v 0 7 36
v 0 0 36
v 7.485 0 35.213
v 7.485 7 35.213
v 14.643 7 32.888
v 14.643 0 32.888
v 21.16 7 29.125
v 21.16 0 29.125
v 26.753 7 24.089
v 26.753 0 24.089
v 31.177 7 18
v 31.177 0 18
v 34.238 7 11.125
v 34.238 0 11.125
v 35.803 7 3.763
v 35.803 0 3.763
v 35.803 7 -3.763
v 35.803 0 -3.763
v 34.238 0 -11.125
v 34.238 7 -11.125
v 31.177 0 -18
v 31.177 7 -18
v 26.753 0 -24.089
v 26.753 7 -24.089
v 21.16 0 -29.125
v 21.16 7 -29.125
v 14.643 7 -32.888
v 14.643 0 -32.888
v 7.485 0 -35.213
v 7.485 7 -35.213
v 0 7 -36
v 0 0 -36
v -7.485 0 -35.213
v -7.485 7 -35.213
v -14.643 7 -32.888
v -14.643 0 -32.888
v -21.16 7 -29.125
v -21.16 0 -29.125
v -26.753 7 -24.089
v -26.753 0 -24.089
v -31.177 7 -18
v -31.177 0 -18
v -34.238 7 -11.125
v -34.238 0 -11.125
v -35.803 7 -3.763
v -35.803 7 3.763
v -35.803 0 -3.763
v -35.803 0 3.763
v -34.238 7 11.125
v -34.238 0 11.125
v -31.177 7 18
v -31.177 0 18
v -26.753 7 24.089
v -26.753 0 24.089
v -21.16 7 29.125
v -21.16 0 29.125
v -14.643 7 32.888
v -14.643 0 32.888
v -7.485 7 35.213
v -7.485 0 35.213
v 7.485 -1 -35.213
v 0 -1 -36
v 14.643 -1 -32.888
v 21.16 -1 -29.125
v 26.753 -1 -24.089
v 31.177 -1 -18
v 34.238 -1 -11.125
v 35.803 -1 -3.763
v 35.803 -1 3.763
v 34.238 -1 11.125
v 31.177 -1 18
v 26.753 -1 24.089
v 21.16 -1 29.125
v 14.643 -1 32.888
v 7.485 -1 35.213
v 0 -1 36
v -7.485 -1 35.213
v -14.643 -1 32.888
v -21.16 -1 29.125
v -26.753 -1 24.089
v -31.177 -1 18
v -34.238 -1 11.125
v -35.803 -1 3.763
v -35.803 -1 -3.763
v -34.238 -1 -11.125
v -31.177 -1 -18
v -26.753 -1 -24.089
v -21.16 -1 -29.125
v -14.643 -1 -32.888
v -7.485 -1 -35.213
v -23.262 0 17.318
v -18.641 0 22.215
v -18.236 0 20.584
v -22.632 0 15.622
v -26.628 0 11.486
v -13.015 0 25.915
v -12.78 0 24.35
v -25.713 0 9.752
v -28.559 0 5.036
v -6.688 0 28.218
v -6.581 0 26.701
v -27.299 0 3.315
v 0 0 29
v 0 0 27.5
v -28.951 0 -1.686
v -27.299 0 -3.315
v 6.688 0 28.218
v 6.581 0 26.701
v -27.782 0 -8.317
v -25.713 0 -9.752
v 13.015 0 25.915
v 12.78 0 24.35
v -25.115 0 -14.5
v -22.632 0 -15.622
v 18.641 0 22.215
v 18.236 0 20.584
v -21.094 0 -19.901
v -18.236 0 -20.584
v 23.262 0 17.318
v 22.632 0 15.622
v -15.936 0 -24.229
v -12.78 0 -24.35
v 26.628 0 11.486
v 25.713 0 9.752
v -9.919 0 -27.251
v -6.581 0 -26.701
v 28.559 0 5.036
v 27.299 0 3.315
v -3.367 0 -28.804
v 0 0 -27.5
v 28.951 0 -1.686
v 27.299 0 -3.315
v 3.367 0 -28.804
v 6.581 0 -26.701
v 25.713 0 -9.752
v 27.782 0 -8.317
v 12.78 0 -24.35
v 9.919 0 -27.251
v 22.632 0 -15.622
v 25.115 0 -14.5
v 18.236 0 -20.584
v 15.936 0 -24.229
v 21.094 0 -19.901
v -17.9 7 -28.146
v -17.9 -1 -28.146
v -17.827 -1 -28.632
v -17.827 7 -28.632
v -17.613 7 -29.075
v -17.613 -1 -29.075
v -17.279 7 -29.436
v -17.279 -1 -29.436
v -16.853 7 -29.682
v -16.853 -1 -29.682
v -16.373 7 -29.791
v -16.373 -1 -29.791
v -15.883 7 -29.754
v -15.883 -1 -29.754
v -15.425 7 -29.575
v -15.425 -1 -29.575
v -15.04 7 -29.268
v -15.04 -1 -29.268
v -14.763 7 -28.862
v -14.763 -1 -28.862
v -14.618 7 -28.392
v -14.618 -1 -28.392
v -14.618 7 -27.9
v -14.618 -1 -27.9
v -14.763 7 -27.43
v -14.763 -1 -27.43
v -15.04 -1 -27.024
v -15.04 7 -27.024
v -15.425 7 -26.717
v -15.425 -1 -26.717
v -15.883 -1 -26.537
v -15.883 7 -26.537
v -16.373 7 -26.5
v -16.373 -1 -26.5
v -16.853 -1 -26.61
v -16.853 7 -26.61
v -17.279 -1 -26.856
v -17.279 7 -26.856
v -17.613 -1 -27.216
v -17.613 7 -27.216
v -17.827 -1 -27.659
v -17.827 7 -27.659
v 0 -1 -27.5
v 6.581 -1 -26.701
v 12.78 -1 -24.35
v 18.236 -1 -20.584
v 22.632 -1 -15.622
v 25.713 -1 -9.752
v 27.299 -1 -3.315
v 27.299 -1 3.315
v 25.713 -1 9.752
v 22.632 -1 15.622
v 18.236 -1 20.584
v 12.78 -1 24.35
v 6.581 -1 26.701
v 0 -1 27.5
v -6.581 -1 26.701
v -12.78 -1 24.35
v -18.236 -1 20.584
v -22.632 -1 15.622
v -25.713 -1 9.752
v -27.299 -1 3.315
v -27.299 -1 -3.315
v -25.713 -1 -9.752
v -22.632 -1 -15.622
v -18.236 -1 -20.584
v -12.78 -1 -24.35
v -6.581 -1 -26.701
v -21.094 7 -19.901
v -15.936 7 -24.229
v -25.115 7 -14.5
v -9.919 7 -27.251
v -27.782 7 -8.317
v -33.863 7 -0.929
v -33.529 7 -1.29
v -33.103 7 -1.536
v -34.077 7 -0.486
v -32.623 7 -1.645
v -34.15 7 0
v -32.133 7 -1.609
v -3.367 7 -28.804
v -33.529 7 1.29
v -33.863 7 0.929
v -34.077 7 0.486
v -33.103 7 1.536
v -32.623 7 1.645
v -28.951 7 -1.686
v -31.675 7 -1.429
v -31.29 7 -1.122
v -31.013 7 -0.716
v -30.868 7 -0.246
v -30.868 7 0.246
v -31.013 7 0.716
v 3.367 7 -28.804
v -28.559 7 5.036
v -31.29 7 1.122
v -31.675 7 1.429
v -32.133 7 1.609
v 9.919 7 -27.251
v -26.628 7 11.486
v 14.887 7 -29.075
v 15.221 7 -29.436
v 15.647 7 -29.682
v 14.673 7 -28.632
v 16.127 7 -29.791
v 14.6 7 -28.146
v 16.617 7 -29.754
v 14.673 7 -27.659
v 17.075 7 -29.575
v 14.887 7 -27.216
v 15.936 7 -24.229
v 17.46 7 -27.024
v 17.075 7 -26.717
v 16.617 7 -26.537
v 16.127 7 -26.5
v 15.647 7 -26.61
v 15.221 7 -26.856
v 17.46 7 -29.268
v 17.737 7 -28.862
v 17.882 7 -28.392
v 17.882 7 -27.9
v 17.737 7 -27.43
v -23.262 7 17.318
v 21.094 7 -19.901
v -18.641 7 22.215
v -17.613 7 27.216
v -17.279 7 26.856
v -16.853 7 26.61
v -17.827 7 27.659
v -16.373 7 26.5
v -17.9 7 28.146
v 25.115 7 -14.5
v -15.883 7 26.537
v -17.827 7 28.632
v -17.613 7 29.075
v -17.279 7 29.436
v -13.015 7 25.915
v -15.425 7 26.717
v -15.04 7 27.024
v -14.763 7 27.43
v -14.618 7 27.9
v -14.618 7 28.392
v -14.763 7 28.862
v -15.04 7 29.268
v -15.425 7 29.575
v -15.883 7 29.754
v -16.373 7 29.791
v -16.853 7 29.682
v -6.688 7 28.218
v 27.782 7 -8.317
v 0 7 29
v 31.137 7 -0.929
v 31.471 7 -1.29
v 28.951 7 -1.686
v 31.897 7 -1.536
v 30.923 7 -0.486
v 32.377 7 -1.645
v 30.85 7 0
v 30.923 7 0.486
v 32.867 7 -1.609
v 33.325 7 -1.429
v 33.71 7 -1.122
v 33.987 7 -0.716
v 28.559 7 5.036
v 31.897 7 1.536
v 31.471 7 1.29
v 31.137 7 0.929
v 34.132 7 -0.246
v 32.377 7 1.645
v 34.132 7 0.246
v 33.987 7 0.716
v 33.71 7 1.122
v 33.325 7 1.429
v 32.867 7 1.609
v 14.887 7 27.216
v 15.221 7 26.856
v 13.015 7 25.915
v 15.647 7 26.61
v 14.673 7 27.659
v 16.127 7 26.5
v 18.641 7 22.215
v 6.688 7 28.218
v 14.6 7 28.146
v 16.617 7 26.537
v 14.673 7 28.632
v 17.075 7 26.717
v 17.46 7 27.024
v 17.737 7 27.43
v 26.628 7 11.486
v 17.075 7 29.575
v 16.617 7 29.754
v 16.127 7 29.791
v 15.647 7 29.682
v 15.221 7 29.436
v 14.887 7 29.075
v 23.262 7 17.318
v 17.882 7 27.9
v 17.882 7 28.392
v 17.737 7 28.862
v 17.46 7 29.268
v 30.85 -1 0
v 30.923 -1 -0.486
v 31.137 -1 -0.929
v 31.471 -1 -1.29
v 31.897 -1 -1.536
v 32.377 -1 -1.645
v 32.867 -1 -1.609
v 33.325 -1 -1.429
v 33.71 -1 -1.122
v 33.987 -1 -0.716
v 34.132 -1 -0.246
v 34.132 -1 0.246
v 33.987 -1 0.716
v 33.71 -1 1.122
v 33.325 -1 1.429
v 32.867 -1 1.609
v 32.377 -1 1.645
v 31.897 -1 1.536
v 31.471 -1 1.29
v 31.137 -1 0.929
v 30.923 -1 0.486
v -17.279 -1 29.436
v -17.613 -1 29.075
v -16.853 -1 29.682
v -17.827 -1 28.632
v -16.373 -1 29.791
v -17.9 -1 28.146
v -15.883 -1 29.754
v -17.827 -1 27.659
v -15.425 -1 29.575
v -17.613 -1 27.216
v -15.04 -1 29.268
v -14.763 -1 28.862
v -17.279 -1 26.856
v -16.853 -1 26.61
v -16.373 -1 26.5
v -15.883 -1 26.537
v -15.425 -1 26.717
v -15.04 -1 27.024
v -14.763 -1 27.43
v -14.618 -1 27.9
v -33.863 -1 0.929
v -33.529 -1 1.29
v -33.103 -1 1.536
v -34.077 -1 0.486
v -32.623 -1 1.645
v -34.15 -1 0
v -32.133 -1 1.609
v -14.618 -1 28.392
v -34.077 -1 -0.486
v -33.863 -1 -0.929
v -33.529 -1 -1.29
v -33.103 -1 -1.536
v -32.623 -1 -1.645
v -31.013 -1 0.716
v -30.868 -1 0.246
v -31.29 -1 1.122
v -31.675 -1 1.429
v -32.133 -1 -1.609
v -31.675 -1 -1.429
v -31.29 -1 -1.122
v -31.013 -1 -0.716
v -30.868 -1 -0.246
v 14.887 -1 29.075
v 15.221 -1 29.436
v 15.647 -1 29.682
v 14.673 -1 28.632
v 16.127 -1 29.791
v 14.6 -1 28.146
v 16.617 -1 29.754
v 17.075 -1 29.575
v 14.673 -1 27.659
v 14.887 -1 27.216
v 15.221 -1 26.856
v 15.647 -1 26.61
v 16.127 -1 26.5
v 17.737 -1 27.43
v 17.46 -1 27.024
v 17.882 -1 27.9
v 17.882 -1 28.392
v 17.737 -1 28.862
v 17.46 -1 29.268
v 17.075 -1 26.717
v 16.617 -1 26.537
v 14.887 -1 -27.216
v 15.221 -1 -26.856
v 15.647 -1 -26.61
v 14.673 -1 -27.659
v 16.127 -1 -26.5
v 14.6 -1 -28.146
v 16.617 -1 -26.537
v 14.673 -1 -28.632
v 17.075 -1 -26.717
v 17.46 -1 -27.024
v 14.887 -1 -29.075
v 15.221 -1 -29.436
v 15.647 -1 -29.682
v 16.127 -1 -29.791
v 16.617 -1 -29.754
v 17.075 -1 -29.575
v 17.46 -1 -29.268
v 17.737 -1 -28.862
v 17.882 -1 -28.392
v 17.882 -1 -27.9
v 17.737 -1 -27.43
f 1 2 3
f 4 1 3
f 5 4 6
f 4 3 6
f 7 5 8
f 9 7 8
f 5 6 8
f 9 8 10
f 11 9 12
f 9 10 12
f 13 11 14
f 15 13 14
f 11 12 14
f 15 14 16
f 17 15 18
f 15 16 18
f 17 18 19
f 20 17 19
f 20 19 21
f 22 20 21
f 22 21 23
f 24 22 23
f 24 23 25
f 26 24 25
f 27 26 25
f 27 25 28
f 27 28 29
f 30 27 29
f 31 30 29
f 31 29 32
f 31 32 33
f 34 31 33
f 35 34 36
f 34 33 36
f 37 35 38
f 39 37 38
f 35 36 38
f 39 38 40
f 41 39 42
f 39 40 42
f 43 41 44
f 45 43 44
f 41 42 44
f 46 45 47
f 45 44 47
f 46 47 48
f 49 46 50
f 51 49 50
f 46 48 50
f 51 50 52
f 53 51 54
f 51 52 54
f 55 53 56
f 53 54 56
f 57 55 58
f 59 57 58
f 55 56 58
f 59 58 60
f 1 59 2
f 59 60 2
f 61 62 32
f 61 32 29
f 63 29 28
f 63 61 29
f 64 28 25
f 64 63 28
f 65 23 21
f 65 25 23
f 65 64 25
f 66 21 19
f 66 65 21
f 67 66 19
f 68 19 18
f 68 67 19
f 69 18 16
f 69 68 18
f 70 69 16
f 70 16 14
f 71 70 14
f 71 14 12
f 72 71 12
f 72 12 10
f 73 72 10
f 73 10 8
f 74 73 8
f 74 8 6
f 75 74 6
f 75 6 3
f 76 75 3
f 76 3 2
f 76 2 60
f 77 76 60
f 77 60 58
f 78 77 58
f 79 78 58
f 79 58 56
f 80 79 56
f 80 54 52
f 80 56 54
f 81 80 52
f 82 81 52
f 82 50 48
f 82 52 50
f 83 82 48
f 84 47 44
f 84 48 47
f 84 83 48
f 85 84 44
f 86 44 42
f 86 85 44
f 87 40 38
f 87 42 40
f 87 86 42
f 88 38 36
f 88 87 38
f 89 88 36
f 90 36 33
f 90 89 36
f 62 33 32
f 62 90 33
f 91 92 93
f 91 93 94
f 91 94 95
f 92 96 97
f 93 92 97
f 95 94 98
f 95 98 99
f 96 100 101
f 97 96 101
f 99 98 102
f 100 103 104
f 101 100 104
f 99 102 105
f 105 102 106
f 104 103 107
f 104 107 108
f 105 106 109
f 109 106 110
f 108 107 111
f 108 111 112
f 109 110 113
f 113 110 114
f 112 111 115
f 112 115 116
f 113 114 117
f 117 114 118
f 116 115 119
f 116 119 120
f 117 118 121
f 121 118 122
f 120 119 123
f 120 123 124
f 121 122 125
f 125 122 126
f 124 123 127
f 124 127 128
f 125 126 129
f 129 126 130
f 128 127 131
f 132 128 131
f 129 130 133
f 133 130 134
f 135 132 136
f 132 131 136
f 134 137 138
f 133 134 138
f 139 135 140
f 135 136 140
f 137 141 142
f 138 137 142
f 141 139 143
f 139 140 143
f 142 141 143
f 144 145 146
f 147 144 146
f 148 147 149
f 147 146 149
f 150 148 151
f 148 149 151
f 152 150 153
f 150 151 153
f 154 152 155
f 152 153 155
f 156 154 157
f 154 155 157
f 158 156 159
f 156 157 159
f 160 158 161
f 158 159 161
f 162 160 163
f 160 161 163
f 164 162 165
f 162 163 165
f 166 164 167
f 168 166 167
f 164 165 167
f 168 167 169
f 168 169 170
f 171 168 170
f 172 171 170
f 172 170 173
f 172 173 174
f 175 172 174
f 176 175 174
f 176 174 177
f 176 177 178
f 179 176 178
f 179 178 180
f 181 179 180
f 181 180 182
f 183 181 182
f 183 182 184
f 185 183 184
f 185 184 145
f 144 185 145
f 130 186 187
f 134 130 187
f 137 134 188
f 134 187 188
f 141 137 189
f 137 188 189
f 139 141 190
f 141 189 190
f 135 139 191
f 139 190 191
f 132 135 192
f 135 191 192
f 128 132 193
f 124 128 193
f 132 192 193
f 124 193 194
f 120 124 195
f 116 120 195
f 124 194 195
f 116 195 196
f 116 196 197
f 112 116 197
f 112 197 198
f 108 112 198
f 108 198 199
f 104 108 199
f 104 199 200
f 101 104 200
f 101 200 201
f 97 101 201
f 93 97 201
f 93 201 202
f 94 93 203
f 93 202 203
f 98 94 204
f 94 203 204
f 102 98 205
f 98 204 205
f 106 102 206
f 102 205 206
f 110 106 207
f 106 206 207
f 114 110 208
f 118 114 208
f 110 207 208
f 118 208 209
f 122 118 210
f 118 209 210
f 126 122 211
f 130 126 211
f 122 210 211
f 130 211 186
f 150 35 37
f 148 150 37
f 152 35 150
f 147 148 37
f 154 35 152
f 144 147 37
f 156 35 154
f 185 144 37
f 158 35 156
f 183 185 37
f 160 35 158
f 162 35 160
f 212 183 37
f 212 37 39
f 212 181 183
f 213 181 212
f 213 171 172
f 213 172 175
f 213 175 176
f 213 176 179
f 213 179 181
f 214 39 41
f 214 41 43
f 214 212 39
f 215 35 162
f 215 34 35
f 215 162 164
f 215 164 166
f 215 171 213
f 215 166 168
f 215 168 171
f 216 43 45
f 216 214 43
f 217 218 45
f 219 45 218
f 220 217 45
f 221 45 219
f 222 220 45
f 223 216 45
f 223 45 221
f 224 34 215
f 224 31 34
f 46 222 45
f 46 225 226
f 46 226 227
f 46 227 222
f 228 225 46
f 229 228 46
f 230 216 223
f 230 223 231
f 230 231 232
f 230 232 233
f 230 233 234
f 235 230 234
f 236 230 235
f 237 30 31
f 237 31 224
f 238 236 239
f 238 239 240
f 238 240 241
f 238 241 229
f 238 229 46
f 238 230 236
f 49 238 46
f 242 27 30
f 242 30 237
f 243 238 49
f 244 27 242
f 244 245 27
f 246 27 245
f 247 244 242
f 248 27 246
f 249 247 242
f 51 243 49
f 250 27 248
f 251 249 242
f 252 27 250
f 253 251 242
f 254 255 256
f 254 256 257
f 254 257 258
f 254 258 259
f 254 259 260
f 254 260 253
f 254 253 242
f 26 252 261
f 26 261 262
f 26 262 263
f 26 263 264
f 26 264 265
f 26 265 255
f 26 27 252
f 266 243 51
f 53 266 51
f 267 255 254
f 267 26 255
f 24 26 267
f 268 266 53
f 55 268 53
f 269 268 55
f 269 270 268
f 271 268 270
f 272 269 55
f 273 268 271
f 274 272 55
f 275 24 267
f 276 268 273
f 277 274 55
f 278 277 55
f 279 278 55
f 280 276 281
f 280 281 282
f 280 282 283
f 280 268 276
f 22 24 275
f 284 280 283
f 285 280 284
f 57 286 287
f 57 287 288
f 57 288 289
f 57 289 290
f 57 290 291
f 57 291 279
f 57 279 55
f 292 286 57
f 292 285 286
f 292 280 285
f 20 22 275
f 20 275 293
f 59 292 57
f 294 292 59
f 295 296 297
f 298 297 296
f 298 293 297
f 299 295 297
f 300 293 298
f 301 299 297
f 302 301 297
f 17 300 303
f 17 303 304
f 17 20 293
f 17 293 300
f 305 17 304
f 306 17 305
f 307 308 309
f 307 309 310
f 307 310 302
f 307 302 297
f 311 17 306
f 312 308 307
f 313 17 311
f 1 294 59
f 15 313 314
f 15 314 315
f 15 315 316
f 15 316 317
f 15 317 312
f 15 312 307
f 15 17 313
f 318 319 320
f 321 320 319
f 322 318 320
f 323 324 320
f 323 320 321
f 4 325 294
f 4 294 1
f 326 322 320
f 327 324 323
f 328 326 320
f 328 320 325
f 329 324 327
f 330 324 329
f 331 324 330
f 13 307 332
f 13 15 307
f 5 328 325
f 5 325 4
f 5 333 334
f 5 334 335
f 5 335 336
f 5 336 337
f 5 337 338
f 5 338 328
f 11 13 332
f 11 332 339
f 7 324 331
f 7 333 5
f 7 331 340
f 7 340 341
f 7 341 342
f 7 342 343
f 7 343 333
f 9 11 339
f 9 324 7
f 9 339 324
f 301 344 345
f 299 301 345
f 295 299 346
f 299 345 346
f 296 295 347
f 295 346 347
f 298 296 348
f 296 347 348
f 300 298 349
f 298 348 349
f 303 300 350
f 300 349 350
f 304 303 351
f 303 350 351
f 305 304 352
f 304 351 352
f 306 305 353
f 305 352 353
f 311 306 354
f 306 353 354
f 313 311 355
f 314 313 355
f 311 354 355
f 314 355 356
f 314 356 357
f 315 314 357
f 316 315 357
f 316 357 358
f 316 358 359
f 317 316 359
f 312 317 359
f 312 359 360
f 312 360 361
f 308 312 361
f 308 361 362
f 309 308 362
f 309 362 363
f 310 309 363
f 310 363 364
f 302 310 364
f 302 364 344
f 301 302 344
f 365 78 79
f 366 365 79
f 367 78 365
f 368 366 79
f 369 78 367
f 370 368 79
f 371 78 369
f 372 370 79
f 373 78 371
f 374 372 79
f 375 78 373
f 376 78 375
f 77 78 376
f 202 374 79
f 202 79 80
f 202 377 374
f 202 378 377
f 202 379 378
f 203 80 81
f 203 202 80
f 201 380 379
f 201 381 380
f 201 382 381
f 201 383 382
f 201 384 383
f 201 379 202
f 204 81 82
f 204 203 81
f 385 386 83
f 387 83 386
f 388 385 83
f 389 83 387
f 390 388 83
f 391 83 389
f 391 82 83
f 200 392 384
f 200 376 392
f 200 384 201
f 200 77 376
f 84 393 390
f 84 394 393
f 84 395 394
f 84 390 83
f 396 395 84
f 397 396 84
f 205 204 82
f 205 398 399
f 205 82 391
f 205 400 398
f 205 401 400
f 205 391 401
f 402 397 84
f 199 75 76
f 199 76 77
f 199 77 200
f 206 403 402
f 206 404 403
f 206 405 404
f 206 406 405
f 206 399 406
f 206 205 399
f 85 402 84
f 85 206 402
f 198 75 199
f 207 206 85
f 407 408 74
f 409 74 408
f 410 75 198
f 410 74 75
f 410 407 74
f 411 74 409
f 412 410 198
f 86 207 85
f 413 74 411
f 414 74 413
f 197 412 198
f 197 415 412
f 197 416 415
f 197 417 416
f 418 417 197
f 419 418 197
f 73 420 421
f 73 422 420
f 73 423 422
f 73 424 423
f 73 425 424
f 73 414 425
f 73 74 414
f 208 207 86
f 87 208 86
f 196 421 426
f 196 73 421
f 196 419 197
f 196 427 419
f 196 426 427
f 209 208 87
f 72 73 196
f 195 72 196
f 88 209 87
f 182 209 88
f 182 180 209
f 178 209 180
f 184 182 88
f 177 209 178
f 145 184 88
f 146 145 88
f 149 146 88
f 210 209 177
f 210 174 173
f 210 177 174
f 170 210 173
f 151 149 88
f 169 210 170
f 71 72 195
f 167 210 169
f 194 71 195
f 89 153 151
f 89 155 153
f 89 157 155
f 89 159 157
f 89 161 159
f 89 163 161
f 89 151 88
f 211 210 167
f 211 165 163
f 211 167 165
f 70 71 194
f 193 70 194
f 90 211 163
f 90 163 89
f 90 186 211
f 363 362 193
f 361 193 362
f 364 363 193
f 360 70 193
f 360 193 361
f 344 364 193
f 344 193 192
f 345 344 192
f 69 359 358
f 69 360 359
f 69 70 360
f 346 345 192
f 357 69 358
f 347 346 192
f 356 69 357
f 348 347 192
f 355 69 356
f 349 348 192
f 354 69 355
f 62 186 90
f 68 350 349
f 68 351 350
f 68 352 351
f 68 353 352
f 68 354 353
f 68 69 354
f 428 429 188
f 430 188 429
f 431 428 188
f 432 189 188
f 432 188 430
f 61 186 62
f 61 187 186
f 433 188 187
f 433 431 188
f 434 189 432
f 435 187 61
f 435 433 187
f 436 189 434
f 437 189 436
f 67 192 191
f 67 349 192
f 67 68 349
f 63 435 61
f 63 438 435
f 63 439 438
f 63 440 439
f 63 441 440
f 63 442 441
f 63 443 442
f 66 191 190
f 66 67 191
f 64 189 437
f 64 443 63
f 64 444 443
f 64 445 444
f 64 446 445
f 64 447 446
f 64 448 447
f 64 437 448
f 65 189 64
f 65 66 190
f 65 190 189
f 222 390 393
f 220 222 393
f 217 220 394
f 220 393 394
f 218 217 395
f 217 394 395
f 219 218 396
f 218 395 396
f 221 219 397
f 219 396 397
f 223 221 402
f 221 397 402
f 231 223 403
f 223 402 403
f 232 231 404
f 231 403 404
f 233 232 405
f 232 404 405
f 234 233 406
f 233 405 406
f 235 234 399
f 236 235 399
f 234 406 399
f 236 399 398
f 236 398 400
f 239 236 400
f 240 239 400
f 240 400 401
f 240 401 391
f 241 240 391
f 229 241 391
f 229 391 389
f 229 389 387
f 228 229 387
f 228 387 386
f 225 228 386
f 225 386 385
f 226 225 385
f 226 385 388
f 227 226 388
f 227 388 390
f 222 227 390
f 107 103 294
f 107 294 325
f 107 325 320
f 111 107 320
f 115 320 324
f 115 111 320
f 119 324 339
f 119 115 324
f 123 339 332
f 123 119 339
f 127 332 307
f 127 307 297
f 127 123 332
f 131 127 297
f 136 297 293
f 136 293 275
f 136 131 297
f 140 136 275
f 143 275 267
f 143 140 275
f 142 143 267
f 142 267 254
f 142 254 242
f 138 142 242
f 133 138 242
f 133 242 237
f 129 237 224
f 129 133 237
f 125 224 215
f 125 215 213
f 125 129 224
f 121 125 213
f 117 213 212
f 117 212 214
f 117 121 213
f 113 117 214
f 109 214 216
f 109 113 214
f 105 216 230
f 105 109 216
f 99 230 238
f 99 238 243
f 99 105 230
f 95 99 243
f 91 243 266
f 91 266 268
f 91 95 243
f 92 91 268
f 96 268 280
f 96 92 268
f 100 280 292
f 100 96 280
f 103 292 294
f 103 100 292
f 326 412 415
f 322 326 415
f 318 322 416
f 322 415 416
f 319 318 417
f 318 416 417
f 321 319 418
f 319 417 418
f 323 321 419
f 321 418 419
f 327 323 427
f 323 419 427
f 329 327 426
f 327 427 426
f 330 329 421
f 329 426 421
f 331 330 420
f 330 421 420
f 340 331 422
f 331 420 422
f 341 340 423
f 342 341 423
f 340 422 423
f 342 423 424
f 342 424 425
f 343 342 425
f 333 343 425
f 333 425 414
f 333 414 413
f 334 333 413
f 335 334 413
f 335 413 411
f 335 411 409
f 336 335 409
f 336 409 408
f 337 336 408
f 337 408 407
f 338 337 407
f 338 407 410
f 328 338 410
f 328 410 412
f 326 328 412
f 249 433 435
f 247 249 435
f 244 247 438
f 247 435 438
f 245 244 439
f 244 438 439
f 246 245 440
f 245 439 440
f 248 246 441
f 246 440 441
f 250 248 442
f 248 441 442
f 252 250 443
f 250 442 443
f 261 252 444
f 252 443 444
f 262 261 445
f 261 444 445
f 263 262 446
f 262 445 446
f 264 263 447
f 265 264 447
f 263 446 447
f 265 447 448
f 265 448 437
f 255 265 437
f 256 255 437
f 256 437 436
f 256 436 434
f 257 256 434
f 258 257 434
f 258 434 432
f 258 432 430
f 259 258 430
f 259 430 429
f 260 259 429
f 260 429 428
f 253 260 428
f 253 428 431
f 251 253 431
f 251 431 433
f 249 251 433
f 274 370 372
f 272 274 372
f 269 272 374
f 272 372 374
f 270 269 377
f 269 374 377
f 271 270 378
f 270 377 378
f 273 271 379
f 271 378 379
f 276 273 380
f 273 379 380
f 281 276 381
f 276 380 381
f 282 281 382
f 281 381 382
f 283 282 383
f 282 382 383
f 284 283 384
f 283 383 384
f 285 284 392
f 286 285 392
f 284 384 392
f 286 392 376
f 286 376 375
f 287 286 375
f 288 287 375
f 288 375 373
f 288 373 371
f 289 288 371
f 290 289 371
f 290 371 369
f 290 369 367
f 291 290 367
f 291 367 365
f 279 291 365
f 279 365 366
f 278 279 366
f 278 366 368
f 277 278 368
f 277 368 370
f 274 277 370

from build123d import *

# Parameters (mm, degrees)
SKETCH_2_R         = 36
SKETCH_2_R_2       = 29
EXTRUDE_1_DEPTH    = 7
EXTRUDE_START      = 1
SKETCH_3_R         = 36
SKETCH_3_R_2       = 27.5
EXTRUDE_2_DEPTH    = 1
HOLE_WIZARD_M4_1_D = 3.3


with BuildPart() as part:
    # 草图2 → 凸台-拉伸1 (new body)
    with BuildSketch(Plane(origin=(0, 0, 0), x_dir=(1, 0, 0), z_dir=(0, 1, 0))):
        with Locations(Location((0, 0, 0), (0, 0, 270))):
            Circle(SKETCH_2_R)
        with Locations(Location((0, 0, 0), (0, 0, 270))):
            Circle(SKETCH_2_R_2, mode=Mode.SUBTRACT)
    extrude(amount=EXTRUDE_1_DEPTH)

    # 草图3 → 凸台-拉伸2 (add)
    with BuildSketch(Plane.XZ.offset(EXTRUDE_START)):
        with Locations(Location((0, 0, 0), (0, 0, 270))):
            Circle(SKETCH_3_R)
        with Locations(Location((0, 0, 0), (0, 0, 270))):
            Circle(SKETCH_3_R_2, mode=Mode.SUBTRACT)
    extrude(amount=-EXTRUDE_2_DEPTH)

    # M4 螺纹孔1 (through all)
    with Locations(Plane(origin=(0, 7, 0), x_dir=(1, 0, 0), z_dir=(0, 1, 0))):
        with Locations((-16.25, 28.145825623), (16.25, 28.145825623), (32.5, 0), (16.25, -28.145825623), (-16.25, -28.145825623), (-32.5, 0)):
            Hole(HOLE_WIZARD_M4_1_D / 2)


solid = part.part
